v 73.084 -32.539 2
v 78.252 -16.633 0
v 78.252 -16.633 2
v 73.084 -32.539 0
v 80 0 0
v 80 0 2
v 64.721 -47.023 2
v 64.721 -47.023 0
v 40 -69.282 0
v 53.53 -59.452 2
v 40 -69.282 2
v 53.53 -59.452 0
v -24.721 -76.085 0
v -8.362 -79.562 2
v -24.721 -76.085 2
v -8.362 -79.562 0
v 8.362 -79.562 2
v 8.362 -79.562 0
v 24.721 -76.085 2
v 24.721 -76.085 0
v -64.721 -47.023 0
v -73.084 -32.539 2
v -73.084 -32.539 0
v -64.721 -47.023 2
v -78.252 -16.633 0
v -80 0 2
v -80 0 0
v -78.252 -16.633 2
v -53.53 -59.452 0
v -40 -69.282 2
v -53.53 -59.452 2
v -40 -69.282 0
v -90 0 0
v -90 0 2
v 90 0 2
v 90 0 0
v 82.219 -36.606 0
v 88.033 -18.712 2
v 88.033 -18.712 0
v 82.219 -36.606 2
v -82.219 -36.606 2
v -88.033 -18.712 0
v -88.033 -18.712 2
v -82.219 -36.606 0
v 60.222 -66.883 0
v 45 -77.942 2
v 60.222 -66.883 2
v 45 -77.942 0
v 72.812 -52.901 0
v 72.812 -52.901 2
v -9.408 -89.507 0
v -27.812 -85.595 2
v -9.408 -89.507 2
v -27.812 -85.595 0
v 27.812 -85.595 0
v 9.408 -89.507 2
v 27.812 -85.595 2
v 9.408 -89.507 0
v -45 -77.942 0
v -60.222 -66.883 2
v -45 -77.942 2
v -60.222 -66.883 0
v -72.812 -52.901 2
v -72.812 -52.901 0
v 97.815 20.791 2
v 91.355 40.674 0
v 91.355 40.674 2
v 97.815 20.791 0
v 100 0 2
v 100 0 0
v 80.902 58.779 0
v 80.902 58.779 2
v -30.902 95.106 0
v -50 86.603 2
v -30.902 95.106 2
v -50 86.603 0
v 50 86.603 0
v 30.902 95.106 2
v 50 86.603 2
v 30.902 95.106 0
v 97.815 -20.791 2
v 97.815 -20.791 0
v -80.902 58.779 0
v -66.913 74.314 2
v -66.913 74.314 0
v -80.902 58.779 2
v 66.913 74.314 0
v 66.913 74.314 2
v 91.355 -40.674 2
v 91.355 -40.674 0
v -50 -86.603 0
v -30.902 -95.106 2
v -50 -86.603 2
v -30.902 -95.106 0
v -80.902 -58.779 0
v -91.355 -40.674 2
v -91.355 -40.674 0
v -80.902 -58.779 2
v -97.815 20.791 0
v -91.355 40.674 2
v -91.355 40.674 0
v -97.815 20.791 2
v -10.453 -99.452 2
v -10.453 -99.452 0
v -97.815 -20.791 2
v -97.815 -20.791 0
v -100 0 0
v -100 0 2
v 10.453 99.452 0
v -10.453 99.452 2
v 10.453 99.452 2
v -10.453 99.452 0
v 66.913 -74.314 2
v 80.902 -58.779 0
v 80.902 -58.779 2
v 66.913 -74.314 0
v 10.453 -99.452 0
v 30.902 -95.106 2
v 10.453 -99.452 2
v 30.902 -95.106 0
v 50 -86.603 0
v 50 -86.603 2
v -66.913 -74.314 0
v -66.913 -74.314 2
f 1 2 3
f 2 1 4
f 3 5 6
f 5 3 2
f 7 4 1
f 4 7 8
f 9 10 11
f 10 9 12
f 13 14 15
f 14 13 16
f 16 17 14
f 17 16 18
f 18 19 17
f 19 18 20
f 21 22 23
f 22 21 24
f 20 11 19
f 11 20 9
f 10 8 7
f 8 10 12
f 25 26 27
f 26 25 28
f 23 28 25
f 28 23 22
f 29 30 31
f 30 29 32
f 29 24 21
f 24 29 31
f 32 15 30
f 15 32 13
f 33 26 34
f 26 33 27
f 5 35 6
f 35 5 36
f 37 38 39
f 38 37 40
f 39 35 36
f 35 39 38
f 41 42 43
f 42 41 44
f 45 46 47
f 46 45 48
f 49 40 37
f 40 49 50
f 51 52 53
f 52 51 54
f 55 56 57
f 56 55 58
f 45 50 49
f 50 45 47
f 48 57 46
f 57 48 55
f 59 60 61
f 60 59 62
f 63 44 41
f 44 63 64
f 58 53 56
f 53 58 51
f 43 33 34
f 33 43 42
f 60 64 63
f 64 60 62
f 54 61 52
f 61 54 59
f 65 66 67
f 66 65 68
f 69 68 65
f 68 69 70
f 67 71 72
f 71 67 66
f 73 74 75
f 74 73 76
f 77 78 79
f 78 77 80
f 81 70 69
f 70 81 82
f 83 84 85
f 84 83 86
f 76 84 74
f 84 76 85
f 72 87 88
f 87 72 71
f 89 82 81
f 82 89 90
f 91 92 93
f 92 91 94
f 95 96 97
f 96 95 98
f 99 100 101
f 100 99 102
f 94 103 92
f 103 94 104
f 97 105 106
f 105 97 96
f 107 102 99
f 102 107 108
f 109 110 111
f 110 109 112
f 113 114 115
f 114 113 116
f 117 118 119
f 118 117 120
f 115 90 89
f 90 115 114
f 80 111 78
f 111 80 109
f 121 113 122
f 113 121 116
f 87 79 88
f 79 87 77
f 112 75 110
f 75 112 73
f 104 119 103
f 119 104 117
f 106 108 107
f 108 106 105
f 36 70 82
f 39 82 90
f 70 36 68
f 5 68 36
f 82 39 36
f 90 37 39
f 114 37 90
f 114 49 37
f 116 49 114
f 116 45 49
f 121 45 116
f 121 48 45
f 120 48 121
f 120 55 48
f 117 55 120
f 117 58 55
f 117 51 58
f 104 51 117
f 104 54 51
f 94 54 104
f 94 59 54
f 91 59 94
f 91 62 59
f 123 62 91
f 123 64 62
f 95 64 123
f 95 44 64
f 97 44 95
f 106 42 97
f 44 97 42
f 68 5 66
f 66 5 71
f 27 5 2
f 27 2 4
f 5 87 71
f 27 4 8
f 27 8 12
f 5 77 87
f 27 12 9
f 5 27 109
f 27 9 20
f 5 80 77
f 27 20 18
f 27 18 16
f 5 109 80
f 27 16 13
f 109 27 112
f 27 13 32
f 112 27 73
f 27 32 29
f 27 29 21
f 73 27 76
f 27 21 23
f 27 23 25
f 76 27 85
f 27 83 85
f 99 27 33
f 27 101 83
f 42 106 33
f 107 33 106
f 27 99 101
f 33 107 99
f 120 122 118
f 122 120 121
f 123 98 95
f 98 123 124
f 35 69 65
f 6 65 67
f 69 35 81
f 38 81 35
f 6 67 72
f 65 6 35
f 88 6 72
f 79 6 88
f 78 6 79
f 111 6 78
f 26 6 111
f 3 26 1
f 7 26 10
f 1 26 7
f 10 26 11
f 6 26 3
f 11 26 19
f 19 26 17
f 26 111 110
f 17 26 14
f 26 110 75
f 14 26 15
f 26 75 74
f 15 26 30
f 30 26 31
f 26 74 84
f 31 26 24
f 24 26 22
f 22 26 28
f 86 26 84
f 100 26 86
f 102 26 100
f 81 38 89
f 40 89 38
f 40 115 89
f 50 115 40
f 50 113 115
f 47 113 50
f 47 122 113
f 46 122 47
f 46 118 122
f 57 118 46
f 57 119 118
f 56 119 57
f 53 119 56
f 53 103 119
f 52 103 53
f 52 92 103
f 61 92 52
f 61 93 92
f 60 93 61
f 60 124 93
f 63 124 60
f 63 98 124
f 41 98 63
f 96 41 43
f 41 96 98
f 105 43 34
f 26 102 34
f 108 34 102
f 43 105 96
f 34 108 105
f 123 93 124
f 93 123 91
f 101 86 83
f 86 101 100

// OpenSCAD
// file: Klima_Protekta_Traction_Dimensions.scad
/* This file contains the key dimensions of various aspects of the traction subsystem.  Change it in one place and everything that is affected by that change is recomputed to be correct. 

This file is to be "include"d into all other traction geometry files.  

include <KlimaProtekta/Traction/Geometry/Klima_Protekta_Traction_Dimensions.scad>;

One advantage of this approach is that it enforces consistency between parts of the car.  

Remember: Calculate Everything (avoid endless tweaking) 


*/

// One unit is one millimeter here
permanentMagnetWidth = 10; // generally width is X (but magnets are rotated here)
permanentMagnetDepth = 10; // generally depth is Y (but magnets are rotated here)
permanentMagnetHeight = 10; // generally height is Z (but magnets are rotated here)
magnetsPerCircle = 64; 
magnetCirclesPerWheel = 2; 
wheelsPerCar = 4; 
echo("Traction Permanent Magnets Per Car: ", magnetsPerCircle * magnetCirclesPerWheel * wheelsPerCar);

degreesPerMagnet = 360 / magnetsPerCircle; // includes gap between magnets
gapEasyInsert = 0.3; // air for both front and back added together, rule of thumb (test to ensure no rattling)
magnetHoleWidth = permanentMagnetWidth + gapEasyInsert; // default 10.3 mm
magnetToMagnetNylon = 0.3; // this is the smallest distance between two magnets in the circle
magnetToAirgapNylon = 0.4; // layer of nylon to keep magnets from rubbing and shattering
airgap = 0.7; //
electromagnetToAirgapNylon = 0.4; // layer of nylon to keep electromagnets from rubbing and shattering
magnetToElectromagnetGap =  magnetToAirgapNylon + airgap + electromagnetToAirgapNylon;
echo("Permanent Magnet To Electromagnet Gap, commonly called Airgap: ", magnetToElectromagnetGap); // note that this is the maximum.  Affected by permanent magnet having straight edges not curved.  Affected by bearing wobble. 

circleOne = 100; // The smallest circle that all of the permanent magnets have two edges passing through. 
// main file
// Klima_Protecta_Traction_Rotor_Grays_Disk

// Design Rationale
/* The gray's disk is a rotary position sensor, acting as an essential part of the brushless DC motor.  Picture two electro-magnets, one as your left hand, the other as your right hand.  Between these two is a permanent magnet.  The position sensor tells you whether theis permanent magnet is a North Pole or a South Pole and also how far along it is.  The motor software will also know the desired direction of travel and thus can decide which electromagnet to make South and which to make North.  

Occassionally the permanent magnet can be bang on or very close to the electromagnet.  If there is also some little momentum in one direction or other the rotor can start rotating in the wrong direction.  In this case the position sensor needs to detect that the rotor is starting to move in the wrong direction and reverse the field before any distance has been moved.  This reversal should happen well before 1cm and best before 1mm. 

Additionally, as the wheel moves off (in the right direction, or now in the right direction) there is a need to adjust the force to get it moving at the right speed.  Force could be adjusted by voltage or by pulse width modulation, but we use PWM.  In either case the gray's disk must detect positions between the magnets. 

The Greys disk is attached to the rotor and spins with the wheel.  The photosensor is part of the stator and does not rotate.  The 

There are 64 magnets in a circle, which is 2 ** 6.  We also wish to detect between magnets - suppose we have 16 positions between magnets, which is 2 ** 4.  Hence that needs 6 + 4 = 10 photosensors

*/
// Features

include<Klima_Protekta_Traction_Dimensions.scad>;
echo (magnetsPerCircle);
difference(){
    color("black") cylinder(2,100, 100); // basic disk, we want to keep, but take parts out of
    translate([0,0,-1])
    difference(){
        color("blue") cylinder(4,90, 90);// first part to remove, running from -1 to +3, so its 1 more each side of 0 to 2. 
        translate([0,0,-1]) union(){
            color("blue") cylinder(6,80, 80); //lies from 0 to 6 in Z direction, translated to -1 to 5, then again to -2 to 4
            translate([-90,0,0])color("blue")cube([180, 90, 6], centre=true);
        } 
    }
} 
